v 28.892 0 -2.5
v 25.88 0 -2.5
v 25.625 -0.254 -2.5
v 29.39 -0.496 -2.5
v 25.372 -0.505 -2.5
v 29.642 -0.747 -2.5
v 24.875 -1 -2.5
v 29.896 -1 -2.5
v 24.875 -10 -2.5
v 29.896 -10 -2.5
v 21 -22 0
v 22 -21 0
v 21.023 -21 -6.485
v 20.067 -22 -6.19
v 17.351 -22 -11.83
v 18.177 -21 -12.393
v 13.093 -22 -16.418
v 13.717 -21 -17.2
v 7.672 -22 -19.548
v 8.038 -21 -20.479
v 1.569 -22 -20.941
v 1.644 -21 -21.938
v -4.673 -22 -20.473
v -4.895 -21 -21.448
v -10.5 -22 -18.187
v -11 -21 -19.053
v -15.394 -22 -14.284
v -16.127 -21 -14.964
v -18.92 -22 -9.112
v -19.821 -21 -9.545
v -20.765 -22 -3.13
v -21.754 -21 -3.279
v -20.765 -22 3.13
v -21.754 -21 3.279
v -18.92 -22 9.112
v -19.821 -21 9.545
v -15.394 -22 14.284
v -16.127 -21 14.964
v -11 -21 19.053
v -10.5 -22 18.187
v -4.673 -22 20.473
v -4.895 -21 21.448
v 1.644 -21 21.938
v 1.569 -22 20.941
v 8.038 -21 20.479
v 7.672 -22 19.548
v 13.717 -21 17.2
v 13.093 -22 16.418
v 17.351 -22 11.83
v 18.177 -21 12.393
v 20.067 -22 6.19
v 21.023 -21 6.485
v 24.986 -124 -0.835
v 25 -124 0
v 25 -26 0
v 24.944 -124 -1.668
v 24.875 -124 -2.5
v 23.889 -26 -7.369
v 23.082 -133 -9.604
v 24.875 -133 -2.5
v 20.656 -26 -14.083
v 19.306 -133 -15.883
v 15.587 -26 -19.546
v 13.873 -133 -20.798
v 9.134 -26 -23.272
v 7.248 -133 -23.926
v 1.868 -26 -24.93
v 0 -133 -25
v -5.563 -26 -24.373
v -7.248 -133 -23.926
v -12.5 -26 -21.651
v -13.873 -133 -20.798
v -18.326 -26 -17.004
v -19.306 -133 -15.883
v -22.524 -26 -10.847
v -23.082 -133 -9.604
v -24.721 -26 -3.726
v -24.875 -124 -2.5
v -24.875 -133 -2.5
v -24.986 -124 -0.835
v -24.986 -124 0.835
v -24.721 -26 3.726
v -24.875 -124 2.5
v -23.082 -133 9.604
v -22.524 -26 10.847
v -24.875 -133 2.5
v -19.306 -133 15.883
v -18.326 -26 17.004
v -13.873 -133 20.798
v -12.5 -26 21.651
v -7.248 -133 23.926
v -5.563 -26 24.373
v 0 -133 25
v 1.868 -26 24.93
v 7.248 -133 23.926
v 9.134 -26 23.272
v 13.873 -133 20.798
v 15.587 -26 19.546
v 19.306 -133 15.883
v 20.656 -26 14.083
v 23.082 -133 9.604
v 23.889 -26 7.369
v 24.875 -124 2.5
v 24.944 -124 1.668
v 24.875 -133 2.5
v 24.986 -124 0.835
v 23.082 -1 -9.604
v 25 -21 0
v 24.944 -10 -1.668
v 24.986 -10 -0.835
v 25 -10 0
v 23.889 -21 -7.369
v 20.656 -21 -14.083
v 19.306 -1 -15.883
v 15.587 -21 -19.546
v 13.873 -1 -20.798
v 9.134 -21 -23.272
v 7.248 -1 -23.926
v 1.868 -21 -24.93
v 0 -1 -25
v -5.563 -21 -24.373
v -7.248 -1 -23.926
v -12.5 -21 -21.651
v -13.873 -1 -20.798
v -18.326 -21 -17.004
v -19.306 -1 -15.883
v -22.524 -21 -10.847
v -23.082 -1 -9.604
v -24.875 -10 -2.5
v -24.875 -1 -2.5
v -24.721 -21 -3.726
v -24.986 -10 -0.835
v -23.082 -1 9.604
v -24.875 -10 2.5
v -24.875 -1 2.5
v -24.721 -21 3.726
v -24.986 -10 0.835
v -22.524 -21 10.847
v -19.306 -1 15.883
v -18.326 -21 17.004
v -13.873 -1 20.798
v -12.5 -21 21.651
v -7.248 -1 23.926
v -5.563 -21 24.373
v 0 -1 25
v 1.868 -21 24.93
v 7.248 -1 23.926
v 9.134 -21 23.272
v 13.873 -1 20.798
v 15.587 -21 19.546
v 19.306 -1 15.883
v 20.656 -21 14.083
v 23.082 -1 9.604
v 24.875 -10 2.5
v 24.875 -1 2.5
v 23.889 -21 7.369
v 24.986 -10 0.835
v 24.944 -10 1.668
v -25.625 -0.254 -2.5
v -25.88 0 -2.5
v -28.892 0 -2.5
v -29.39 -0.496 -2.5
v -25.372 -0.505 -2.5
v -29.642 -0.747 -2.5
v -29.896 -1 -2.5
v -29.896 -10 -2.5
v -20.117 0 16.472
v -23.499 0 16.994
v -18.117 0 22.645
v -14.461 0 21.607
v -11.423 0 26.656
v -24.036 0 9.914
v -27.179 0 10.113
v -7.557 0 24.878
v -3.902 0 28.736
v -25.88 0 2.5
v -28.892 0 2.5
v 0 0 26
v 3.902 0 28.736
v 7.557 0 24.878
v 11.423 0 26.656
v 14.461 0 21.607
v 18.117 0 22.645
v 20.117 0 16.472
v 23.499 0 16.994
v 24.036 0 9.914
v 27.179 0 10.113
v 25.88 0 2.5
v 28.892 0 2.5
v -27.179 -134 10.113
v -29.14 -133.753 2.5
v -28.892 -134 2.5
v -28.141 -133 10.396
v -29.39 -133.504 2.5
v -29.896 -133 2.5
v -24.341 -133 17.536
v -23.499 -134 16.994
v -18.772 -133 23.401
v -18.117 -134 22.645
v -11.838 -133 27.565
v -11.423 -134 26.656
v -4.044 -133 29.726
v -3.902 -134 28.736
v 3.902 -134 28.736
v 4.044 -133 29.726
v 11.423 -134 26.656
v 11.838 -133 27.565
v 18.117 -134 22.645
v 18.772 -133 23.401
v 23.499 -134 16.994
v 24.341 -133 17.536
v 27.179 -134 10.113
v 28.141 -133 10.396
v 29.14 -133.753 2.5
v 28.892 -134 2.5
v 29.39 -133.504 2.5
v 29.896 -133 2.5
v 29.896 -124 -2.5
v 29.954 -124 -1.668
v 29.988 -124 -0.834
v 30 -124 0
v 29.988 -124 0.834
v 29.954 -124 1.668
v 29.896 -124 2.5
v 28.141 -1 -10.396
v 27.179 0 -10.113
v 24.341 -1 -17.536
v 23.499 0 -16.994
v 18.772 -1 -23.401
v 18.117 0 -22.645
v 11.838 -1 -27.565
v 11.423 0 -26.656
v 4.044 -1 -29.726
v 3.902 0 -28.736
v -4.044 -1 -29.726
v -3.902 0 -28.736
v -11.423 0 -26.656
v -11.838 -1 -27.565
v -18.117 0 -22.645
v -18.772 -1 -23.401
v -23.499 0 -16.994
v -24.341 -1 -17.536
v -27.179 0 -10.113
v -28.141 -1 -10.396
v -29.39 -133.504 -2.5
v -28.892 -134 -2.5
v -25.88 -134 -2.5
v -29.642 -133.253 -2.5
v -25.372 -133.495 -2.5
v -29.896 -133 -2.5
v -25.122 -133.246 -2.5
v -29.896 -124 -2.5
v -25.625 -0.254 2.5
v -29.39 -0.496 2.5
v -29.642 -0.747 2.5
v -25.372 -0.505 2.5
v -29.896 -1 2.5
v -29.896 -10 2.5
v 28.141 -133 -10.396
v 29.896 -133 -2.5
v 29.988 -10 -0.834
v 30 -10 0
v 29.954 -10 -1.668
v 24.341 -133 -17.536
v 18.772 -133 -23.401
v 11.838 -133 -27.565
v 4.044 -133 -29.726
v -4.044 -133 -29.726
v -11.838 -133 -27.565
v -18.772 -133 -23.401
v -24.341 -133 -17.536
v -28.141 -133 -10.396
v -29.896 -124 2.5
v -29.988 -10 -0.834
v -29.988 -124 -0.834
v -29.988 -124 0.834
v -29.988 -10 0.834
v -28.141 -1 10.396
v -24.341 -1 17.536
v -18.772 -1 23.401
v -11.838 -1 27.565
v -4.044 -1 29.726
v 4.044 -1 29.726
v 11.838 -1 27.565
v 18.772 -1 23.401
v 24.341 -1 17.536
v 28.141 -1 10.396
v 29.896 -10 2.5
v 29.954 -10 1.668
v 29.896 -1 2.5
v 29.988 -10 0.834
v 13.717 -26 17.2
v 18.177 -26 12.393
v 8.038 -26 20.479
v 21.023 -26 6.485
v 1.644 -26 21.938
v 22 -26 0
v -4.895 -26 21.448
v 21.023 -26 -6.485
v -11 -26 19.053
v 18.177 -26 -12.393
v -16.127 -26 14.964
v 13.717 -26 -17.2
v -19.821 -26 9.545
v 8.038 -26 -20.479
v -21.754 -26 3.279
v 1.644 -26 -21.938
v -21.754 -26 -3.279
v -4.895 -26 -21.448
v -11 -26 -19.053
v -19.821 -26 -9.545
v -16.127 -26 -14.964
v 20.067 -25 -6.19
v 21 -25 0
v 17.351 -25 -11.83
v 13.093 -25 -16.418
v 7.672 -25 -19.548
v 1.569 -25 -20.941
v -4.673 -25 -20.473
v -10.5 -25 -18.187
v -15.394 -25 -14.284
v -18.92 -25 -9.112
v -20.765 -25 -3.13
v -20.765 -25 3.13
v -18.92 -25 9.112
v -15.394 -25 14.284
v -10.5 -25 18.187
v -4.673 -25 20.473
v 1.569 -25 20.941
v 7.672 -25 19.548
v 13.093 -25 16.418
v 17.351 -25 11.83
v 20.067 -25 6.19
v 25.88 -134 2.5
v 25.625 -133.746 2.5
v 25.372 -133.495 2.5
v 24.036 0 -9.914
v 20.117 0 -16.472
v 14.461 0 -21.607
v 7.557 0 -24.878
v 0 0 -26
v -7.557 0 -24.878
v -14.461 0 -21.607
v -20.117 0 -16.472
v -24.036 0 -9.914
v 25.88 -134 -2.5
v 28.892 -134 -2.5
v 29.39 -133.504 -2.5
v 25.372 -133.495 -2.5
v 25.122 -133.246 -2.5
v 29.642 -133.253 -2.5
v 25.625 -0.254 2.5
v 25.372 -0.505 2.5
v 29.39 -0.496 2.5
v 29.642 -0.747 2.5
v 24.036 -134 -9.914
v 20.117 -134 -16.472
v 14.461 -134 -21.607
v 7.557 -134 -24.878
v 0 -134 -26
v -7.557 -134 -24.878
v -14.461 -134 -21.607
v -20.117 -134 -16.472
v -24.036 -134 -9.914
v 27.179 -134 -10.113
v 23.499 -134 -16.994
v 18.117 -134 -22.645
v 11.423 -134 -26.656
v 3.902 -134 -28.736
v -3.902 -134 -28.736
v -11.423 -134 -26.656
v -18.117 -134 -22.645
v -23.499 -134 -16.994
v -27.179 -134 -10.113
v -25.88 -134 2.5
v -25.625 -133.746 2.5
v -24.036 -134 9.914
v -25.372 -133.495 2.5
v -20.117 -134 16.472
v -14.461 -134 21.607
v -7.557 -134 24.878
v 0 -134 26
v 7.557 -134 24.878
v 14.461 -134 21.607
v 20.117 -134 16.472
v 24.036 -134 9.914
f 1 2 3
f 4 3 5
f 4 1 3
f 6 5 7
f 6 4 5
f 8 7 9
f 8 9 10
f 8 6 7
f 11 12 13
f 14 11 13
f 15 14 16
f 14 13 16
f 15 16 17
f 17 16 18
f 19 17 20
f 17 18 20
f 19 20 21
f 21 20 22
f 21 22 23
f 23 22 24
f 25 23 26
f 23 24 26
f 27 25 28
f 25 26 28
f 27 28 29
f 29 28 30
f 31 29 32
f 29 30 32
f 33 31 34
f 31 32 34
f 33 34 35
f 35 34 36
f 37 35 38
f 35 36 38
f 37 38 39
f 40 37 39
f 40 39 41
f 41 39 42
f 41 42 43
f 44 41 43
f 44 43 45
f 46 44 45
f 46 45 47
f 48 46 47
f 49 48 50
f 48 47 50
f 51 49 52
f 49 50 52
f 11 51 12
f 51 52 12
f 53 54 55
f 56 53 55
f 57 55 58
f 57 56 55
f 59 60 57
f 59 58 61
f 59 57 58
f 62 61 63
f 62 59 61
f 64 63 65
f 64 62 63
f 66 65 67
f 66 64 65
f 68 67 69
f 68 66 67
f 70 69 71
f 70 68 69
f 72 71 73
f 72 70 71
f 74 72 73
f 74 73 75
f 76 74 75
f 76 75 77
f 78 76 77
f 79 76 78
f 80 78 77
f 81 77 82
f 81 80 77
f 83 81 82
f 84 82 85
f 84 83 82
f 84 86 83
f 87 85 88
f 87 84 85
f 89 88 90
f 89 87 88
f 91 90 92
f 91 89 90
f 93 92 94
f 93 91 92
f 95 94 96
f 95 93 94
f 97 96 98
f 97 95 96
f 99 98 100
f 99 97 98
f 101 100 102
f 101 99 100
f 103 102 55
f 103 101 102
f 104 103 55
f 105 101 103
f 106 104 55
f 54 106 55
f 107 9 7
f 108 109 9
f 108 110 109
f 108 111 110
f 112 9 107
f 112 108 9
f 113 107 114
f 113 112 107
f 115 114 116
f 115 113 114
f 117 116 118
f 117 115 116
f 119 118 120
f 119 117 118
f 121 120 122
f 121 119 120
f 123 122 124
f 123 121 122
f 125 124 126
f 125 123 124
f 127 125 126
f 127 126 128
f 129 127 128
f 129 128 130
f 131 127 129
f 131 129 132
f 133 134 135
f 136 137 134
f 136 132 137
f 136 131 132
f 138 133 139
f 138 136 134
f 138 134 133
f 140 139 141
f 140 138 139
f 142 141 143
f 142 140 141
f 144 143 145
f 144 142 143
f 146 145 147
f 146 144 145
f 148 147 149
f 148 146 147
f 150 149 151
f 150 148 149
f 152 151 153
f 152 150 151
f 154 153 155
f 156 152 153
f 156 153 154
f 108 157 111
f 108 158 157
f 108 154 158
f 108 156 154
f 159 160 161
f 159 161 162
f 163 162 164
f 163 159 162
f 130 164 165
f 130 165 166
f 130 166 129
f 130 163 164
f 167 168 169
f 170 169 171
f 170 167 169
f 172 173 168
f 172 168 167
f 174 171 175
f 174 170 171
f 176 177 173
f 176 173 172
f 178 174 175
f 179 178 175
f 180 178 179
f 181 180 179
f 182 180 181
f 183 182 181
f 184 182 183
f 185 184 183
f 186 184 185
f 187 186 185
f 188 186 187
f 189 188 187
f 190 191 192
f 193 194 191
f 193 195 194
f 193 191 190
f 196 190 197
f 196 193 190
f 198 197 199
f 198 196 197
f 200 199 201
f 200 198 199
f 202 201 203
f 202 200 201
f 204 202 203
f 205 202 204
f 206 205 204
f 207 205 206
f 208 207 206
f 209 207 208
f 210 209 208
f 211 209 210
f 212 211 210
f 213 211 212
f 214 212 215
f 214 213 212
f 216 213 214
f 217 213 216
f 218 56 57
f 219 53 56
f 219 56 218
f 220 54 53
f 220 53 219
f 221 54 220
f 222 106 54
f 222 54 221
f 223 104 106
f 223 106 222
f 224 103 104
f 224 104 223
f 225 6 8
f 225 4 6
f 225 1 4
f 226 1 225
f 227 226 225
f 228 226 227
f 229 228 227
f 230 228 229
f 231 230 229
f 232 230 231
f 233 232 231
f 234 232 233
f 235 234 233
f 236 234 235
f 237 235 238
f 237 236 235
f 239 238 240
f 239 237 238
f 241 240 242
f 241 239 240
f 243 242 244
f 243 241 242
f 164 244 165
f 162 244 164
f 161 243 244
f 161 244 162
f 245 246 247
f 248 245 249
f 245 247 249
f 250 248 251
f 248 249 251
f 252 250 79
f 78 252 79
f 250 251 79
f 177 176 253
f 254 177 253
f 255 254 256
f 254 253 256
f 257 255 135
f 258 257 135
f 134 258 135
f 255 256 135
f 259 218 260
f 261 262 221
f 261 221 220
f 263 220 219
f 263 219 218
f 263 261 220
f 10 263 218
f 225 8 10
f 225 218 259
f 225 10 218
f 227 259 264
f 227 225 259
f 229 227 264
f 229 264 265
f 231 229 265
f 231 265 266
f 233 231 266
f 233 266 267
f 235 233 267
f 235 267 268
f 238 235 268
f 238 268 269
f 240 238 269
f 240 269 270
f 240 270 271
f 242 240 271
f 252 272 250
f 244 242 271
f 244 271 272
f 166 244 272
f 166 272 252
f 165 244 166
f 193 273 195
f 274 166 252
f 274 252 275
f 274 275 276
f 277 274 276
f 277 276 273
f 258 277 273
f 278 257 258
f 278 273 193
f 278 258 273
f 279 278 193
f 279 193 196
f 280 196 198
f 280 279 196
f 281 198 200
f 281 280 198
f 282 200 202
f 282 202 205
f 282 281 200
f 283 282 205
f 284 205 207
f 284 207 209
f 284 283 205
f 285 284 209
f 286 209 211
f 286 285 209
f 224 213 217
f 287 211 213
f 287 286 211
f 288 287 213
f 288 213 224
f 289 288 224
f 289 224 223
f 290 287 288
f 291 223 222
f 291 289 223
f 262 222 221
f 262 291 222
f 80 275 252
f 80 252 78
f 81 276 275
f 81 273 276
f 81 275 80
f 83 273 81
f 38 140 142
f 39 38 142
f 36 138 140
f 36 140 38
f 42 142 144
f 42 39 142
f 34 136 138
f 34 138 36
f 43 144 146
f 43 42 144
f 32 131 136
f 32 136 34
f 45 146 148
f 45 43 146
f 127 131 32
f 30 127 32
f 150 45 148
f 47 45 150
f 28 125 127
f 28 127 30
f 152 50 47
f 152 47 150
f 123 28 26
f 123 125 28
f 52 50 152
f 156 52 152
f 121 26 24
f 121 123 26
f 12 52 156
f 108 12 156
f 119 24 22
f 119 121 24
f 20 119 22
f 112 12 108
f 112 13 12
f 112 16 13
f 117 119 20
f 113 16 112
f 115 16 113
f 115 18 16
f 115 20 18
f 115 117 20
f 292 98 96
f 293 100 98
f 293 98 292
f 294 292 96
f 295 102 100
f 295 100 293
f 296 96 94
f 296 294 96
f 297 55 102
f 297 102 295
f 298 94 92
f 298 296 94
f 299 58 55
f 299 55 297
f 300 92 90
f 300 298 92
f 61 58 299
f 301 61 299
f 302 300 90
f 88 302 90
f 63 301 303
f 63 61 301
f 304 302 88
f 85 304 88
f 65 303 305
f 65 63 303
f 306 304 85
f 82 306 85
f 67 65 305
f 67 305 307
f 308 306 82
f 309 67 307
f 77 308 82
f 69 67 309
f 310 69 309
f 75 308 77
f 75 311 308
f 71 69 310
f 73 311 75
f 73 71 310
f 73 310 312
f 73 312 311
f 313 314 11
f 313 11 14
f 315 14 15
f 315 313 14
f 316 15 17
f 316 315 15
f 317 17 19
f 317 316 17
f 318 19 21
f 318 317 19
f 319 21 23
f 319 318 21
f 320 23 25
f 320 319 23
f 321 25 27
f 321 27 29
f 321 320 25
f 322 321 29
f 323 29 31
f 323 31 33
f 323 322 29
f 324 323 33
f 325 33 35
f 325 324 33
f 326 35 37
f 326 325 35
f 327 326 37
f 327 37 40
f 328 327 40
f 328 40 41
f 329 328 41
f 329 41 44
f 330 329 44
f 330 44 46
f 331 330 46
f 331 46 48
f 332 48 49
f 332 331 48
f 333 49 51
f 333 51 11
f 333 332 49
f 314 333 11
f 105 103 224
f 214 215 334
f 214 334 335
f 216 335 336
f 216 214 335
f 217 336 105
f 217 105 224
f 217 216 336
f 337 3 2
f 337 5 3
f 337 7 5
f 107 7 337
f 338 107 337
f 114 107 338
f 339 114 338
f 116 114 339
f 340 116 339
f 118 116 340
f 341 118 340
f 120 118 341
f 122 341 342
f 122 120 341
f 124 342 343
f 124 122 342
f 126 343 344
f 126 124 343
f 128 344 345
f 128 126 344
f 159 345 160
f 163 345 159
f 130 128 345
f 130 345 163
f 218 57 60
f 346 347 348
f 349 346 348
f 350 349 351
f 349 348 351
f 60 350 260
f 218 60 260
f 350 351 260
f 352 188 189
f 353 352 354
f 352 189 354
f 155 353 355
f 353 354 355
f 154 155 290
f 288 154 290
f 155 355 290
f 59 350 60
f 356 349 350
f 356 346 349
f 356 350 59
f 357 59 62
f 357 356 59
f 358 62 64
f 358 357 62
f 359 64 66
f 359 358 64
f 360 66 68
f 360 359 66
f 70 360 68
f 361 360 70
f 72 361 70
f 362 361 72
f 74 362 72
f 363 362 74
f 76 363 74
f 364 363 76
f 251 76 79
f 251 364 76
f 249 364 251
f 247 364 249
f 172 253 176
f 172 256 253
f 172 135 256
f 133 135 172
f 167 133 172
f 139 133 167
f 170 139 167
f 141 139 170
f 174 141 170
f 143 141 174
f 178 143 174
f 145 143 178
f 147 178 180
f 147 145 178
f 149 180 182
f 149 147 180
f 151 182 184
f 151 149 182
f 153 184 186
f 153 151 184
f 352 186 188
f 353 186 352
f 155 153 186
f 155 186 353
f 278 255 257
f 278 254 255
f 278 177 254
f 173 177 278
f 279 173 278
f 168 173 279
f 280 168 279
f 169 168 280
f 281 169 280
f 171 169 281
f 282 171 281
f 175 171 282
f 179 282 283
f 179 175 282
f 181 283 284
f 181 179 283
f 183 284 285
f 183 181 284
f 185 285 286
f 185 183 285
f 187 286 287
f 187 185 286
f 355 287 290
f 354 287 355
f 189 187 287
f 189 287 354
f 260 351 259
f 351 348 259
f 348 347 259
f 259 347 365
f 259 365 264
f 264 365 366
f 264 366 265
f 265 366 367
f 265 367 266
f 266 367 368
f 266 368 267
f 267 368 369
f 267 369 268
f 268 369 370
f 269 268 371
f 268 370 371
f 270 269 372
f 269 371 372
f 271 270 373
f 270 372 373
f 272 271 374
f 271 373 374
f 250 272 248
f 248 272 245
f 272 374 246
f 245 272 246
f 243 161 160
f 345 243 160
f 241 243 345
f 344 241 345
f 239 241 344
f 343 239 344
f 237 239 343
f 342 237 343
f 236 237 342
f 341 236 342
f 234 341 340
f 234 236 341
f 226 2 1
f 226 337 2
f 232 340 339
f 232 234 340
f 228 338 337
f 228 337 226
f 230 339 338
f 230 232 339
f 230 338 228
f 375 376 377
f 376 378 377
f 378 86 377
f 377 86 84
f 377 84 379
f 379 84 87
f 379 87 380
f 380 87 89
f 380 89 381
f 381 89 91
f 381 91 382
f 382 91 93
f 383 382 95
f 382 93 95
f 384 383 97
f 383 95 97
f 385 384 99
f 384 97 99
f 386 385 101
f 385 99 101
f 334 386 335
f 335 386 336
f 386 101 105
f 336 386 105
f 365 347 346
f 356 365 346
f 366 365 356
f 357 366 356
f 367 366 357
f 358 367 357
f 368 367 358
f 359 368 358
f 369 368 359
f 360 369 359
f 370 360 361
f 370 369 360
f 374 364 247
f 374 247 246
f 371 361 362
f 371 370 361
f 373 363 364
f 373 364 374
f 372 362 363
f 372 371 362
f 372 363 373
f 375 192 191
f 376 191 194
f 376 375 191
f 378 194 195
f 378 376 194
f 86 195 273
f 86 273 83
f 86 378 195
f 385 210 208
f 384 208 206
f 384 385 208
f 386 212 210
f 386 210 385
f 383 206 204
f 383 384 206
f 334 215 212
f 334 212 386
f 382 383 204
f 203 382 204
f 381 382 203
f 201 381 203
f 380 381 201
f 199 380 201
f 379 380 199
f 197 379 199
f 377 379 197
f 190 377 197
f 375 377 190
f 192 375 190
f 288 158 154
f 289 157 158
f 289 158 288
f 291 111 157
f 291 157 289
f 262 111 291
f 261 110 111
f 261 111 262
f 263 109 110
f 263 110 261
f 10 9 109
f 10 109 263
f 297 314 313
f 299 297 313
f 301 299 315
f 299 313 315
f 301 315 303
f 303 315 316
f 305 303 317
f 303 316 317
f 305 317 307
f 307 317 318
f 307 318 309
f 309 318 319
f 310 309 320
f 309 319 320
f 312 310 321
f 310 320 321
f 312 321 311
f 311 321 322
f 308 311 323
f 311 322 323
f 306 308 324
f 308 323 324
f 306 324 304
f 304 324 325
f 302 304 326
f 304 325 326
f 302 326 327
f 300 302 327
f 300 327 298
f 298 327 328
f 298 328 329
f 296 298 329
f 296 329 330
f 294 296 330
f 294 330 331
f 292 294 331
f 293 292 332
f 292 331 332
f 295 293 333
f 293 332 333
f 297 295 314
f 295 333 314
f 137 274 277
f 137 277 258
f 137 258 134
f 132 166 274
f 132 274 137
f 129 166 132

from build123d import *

# Parameters (mm, degrees)
SKETCH2_W          = 70
SKETCH2_H          = 5
CUT_EXTRUDE1_DEPTH = 10
SKETCH3_W          = 70
SKETCH3_H          = 5
CUT_EXTRUDE2_DEPTH = 10
CHAMFER1_SIZE      = 1


with BuildPart() as part:
    # Sketch1 → Revolve1 (revolve)
    with BuildSketch(Plane.XY):
        Polygon((25, -134), (30, -134), (30, 0), (25, 0), (25, -21), (21, -21), (21, -26), (25, -26), align=None)
    revolve(axis=Axis((0, 0, 0), (0, 1, 0)))

    # Sketch2 → Cut-Extrude1 (cut)
    with BuildSketch(Plane(origin=(0, 0, 0), x_dir=(1, 0, 0), z_dir=(0, 1, 0))):
        Rectangle(SKETCH2_W, SKETCH2_H)
    extrude(amount=-CUT_EXTRUDE1_DEPTH, mode=Mode.SUBTRACT)

    # Sketch3 → Cut-Extrude2 (cut)
    with BuildSketch(Plane.XZ.offset(134)):
        Rectangle(SKETCH3_W, SKETCH3_H)
    extrude(amount=-CUT_EXTRUDE2_DEPTH, mode=Mode.SUBTRACT)

    # Chamfer1
    chamfer1_edges = [part.edges().sort_by_distance(p)[0] for p in [
        (-21, -26, 0),
        (-21, -21, 0),
        (0, 0, 25),
        (0, 0, -25),
        (0, 0, 30),
        (0, 0, -30),
        (0, -134, 30),
        (0, -134, -30),
        (0, -134, 25),
        (0, -134, -25),
    ]]
    chamfer(chamfer1_edges, length=CHAMFER1_SIZE)


solid = part.part
